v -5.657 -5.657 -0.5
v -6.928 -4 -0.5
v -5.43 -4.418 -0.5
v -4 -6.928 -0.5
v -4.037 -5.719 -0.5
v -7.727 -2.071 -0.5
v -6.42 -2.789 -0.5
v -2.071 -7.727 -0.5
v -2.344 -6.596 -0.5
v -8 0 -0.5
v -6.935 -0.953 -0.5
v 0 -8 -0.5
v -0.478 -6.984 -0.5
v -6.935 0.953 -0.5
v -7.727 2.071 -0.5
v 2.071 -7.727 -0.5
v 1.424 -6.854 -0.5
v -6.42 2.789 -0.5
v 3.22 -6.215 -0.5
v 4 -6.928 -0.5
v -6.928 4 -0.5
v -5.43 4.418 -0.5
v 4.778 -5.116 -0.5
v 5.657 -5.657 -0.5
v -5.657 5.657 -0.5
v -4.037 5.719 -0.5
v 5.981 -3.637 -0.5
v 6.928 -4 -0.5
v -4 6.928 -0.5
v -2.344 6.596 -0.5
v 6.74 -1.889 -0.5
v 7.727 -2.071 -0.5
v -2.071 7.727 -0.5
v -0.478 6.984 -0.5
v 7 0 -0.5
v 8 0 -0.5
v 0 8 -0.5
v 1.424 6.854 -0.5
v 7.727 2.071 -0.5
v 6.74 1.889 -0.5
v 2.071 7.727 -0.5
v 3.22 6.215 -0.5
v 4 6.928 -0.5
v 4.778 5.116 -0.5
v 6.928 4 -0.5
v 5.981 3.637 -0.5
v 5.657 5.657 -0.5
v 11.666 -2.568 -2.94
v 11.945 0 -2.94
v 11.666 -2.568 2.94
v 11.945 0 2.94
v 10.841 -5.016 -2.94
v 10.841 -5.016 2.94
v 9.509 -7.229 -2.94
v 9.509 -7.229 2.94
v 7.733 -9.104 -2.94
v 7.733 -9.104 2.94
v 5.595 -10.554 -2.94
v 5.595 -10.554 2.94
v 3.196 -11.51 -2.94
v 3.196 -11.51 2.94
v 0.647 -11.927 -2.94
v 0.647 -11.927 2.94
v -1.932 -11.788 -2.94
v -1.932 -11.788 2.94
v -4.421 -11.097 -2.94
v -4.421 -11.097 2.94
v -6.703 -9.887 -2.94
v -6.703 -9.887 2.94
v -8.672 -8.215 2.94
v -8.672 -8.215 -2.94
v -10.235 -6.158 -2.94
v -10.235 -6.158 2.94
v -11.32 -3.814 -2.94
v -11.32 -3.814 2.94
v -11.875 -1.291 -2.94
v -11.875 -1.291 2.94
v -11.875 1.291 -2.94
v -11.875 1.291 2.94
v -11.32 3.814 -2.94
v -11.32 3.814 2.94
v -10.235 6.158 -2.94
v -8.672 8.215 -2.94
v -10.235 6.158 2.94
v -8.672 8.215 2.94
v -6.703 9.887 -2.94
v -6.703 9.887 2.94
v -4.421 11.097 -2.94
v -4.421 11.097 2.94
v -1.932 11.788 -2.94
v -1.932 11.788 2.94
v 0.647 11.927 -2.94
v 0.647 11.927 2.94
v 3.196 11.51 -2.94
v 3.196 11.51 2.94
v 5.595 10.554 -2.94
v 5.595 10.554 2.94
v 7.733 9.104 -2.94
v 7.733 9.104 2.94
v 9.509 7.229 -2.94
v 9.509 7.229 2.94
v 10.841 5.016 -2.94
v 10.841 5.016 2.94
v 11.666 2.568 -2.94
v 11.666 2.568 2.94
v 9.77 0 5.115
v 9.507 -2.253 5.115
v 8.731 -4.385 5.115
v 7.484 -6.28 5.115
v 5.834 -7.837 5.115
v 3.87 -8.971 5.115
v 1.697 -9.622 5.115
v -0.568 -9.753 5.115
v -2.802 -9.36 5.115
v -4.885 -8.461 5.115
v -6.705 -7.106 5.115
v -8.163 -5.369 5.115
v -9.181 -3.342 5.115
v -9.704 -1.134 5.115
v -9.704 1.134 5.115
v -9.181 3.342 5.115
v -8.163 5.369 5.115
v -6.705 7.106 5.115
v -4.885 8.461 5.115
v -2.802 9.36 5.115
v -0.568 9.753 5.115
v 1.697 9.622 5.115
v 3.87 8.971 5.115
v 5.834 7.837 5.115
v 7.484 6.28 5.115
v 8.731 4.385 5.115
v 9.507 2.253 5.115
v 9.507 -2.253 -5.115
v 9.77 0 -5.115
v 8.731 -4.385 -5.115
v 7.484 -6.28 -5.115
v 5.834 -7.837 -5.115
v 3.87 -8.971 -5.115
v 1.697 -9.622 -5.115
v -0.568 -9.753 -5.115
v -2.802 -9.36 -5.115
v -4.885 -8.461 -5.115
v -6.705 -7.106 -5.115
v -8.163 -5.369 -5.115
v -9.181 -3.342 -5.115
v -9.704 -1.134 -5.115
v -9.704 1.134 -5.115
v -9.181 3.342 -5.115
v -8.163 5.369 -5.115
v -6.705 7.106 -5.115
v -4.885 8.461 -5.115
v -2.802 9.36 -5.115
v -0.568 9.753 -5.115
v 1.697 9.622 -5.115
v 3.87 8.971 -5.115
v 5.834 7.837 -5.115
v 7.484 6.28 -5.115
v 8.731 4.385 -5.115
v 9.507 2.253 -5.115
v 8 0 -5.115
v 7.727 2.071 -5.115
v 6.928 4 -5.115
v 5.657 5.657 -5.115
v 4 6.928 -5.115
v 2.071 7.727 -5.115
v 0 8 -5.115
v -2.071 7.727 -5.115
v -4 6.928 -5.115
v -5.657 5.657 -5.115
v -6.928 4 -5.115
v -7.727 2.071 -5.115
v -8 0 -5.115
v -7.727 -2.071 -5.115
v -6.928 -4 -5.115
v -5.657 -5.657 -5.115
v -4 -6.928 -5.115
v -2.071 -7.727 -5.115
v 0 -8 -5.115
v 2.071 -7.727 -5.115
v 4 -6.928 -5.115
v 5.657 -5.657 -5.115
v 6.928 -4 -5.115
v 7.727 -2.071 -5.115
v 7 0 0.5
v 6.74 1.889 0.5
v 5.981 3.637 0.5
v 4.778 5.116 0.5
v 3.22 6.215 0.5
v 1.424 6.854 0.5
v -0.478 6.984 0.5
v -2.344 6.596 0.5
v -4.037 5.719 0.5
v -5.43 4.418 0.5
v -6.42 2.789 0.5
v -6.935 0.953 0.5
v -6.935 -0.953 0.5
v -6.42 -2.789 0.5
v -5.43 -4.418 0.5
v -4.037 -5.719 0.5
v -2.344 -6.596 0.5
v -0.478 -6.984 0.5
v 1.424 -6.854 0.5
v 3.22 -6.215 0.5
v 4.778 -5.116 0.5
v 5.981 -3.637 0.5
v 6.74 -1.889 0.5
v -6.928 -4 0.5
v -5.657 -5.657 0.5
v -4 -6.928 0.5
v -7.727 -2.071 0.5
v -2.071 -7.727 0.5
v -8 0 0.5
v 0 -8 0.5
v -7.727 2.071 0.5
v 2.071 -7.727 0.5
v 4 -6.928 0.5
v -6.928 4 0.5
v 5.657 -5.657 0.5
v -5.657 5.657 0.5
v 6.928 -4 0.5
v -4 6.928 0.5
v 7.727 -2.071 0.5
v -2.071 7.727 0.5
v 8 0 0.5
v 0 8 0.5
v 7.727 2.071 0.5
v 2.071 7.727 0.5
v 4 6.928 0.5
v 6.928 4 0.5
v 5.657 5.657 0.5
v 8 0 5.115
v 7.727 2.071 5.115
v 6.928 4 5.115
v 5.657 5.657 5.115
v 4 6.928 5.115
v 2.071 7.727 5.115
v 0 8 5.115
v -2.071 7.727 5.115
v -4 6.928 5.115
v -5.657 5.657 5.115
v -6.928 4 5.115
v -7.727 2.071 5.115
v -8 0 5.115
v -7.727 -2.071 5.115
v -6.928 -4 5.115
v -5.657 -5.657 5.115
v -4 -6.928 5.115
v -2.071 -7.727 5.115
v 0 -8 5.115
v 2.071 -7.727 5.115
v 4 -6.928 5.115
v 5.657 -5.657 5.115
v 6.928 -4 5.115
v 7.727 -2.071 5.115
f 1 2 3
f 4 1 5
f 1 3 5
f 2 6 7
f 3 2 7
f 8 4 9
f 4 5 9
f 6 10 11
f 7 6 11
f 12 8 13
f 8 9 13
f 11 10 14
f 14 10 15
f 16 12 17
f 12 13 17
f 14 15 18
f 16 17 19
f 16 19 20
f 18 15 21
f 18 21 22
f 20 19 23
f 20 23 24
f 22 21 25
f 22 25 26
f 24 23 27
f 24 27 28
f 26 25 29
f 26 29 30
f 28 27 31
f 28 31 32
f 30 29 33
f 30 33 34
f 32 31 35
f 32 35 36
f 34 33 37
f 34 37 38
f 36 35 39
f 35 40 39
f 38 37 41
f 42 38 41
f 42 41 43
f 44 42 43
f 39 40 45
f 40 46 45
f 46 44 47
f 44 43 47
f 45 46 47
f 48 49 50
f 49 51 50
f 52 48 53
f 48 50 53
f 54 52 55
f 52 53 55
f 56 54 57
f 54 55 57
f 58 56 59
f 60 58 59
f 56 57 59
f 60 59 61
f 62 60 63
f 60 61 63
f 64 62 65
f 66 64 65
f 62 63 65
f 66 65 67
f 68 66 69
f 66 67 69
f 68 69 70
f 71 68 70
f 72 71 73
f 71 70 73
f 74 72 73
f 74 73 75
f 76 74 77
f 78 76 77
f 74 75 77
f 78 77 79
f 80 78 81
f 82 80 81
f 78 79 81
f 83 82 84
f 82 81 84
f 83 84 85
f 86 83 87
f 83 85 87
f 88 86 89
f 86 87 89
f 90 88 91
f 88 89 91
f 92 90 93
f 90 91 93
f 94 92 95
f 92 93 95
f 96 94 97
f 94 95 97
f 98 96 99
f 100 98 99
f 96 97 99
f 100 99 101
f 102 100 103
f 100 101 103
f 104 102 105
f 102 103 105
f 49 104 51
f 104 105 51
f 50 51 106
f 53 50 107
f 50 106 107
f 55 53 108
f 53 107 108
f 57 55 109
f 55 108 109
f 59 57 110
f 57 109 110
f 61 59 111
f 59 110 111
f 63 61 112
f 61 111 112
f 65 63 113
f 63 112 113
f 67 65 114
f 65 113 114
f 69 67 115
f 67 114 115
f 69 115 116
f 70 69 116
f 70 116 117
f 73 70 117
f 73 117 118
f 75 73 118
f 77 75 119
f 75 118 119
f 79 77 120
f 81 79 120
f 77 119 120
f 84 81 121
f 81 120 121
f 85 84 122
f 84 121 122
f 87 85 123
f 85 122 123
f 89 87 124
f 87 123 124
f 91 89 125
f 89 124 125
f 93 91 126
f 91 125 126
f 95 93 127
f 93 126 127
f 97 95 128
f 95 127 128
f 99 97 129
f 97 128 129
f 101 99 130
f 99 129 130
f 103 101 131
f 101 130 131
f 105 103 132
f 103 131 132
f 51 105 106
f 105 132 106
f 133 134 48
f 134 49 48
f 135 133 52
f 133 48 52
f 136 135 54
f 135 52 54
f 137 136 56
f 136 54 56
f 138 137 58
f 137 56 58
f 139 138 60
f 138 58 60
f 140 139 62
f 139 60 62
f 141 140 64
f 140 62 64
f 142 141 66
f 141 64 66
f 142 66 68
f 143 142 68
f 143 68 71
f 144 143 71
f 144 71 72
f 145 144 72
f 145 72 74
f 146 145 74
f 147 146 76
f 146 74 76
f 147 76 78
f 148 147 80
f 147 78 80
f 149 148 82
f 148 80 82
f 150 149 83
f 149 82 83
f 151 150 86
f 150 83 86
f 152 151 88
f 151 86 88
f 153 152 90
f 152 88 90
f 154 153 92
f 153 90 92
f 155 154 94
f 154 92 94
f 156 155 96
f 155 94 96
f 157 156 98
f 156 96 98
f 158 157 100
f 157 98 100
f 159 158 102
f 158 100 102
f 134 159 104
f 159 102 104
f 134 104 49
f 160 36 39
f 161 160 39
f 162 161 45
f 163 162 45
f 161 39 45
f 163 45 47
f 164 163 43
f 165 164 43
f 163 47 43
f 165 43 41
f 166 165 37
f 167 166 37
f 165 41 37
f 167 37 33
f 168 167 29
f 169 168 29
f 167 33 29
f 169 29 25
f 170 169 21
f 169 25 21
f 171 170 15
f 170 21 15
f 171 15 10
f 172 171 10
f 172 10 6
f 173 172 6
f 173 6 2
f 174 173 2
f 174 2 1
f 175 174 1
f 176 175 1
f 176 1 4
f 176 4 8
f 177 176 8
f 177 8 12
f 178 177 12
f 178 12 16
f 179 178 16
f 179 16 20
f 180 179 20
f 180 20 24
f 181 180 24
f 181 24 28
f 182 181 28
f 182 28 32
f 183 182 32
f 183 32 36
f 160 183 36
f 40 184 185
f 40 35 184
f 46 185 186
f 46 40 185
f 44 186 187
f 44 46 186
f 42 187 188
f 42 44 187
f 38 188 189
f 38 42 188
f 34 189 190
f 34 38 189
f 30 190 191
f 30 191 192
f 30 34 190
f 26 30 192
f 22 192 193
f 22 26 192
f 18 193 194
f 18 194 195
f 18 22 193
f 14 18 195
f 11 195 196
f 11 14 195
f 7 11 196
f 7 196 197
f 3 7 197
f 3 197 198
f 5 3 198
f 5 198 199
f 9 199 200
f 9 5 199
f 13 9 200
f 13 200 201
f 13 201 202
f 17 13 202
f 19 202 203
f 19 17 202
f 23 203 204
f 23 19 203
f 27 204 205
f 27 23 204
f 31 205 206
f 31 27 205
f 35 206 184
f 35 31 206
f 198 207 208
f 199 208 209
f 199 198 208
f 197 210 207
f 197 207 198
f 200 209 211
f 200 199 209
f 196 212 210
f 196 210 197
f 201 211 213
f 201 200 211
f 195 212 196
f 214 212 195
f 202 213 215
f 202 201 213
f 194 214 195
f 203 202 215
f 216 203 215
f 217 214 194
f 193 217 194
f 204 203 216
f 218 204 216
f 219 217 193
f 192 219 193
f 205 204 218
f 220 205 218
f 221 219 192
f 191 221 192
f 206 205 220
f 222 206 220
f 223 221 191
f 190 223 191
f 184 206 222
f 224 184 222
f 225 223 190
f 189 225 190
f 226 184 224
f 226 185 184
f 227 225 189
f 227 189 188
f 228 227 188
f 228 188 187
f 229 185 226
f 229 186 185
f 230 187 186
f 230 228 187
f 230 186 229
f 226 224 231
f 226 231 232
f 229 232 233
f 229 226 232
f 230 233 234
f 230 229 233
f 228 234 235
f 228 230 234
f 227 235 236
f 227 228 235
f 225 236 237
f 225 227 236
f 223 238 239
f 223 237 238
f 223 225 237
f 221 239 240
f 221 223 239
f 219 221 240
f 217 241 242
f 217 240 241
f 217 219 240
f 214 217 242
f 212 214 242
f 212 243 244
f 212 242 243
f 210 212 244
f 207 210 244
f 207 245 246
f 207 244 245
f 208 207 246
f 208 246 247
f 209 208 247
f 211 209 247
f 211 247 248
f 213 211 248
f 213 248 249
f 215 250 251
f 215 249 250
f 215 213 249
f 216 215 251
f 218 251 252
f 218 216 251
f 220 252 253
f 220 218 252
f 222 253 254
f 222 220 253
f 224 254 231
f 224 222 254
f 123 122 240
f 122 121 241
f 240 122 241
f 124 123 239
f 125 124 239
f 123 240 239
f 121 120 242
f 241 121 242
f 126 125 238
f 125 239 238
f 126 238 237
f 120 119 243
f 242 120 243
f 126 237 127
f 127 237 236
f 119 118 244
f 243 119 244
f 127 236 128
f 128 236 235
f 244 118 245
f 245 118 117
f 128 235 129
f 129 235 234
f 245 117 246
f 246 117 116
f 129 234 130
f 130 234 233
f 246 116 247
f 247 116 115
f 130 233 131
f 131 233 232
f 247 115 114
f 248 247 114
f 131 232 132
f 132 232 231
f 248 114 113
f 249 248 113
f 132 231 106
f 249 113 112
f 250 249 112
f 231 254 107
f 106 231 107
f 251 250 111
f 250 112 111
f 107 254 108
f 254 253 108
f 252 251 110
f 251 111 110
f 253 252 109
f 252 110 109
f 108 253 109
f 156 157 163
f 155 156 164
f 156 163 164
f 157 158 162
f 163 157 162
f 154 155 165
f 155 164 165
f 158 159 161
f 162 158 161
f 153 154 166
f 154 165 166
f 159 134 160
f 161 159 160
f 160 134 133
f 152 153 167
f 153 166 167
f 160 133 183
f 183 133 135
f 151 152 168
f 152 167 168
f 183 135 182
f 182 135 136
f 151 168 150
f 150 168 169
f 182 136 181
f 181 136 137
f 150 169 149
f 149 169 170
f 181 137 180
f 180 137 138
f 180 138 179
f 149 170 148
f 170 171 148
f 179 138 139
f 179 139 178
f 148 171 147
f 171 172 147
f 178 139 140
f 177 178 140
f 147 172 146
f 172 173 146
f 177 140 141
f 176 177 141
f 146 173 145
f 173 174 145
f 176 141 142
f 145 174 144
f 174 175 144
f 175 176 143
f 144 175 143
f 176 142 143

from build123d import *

# Parameters (mm, degrees)
F2_R          = 8
F3_DEPTH      = 5.116
F3_DEPTH_BACK = 5.116
F4_R          = 8
F4_R_2        = 7
F5_DEPTH      = 0.5


with BuildPart() as f1:
    # F0 (on Front) → F1 (revolve)
    with BuildSketch(Plane.XZ):
        Polygon((9.77, 5.115), (0, 5.115), (0, -5.115), (9.77, -5.115), (11.945, -2.94), (11.945, 2.94), align=None)
    revolve(axis=Axis((0, 0, 0), (0, 0, -1)))

    # F2 (on Top) → F3 (cut, two sides)
    with BuildSketch(Plane.XY) as f3_sk:
        Circle(F2_R)
    extrude(amount=-F3_DEPTH, mode=Mode.SUBTRACT)
    extrude(f3_sk.sketch, amount=F3_DEPTH_BACK, mode=Mode.SUBTRACT)

    # F4 (on Top) → F5 (join, symmetric)
    with BuildSketch(Plane.XY):
        Circle(F4_R)
        Circle(F4_R_2, mode=Mode.SUBTRACT)
    extrude(amount=F5_DEPTH, both=True)


solid = f1.part
